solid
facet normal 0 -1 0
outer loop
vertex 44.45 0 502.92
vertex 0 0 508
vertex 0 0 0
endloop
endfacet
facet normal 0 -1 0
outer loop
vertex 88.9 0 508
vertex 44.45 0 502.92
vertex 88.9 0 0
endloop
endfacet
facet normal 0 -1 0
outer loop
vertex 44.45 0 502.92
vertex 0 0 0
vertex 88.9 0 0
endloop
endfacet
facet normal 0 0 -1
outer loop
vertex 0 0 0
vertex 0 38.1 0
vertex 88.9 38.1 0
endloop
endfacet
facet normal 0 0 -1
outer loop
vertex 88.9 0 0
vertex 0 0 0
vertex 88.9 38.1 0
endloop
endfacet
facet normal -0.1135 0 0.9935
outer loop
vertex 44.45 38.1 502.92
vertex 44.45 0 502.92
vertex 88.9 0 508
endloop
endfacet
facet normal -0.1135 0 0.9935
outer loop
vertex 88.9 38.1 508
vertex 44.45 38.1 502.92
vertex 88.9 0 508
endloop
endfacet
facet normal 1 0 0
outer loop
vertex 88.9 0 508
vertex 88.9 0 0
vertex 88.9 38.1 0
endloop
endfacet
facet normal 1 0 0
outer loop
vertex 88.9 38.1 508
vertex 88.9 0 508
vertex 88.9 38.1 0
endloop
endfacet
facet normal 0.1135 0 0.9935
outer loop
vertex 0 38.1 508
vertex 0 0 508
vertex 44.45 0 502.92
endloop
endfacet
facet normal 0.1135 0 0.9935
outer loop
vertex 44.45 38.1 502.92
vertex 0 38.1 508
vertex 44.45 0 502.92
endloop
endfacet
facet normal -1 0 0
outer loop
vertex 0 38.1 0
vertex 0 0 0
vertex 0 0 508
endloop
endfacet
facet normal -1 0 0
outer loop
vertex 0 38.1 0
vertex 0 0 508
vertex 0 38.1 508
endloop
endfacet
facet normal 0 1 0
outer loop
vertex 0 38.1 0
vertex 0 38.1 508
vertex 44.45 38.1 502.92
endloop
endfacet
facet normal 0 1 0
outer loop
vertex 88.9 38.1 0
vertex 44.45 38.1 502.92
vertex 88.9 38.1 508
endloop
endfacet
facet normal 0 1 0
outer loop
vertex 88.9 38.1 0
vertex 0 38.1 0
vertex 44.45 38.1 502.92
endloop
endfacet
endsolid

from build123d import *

# Parameters (mm, degrees)
F0_W     = 88.9
F0_H     = 38.1
F1_DEPTH = 508
F3_DEPTH = 38.1


with BuildPart() as f1:
    # F0 (on Top) → F1 (new body)
    with BuildSketch(Plane.XY):
        with Locations((44.45, 19.05)):
            Rectangle(F0_W, F0_H)
    extrude(amount=F1_DEPTH)

    # F2 (on face) → F3 (cut, through all)
    with BuildSketch(Plane.XZ):
        Polygon((88.9, 508), (0, 508), (44.45, 502.92), align=None)
    extrude(amount=-F3_DEPTH, mode=Mode.SUBTRACT)


solid = f1.part
